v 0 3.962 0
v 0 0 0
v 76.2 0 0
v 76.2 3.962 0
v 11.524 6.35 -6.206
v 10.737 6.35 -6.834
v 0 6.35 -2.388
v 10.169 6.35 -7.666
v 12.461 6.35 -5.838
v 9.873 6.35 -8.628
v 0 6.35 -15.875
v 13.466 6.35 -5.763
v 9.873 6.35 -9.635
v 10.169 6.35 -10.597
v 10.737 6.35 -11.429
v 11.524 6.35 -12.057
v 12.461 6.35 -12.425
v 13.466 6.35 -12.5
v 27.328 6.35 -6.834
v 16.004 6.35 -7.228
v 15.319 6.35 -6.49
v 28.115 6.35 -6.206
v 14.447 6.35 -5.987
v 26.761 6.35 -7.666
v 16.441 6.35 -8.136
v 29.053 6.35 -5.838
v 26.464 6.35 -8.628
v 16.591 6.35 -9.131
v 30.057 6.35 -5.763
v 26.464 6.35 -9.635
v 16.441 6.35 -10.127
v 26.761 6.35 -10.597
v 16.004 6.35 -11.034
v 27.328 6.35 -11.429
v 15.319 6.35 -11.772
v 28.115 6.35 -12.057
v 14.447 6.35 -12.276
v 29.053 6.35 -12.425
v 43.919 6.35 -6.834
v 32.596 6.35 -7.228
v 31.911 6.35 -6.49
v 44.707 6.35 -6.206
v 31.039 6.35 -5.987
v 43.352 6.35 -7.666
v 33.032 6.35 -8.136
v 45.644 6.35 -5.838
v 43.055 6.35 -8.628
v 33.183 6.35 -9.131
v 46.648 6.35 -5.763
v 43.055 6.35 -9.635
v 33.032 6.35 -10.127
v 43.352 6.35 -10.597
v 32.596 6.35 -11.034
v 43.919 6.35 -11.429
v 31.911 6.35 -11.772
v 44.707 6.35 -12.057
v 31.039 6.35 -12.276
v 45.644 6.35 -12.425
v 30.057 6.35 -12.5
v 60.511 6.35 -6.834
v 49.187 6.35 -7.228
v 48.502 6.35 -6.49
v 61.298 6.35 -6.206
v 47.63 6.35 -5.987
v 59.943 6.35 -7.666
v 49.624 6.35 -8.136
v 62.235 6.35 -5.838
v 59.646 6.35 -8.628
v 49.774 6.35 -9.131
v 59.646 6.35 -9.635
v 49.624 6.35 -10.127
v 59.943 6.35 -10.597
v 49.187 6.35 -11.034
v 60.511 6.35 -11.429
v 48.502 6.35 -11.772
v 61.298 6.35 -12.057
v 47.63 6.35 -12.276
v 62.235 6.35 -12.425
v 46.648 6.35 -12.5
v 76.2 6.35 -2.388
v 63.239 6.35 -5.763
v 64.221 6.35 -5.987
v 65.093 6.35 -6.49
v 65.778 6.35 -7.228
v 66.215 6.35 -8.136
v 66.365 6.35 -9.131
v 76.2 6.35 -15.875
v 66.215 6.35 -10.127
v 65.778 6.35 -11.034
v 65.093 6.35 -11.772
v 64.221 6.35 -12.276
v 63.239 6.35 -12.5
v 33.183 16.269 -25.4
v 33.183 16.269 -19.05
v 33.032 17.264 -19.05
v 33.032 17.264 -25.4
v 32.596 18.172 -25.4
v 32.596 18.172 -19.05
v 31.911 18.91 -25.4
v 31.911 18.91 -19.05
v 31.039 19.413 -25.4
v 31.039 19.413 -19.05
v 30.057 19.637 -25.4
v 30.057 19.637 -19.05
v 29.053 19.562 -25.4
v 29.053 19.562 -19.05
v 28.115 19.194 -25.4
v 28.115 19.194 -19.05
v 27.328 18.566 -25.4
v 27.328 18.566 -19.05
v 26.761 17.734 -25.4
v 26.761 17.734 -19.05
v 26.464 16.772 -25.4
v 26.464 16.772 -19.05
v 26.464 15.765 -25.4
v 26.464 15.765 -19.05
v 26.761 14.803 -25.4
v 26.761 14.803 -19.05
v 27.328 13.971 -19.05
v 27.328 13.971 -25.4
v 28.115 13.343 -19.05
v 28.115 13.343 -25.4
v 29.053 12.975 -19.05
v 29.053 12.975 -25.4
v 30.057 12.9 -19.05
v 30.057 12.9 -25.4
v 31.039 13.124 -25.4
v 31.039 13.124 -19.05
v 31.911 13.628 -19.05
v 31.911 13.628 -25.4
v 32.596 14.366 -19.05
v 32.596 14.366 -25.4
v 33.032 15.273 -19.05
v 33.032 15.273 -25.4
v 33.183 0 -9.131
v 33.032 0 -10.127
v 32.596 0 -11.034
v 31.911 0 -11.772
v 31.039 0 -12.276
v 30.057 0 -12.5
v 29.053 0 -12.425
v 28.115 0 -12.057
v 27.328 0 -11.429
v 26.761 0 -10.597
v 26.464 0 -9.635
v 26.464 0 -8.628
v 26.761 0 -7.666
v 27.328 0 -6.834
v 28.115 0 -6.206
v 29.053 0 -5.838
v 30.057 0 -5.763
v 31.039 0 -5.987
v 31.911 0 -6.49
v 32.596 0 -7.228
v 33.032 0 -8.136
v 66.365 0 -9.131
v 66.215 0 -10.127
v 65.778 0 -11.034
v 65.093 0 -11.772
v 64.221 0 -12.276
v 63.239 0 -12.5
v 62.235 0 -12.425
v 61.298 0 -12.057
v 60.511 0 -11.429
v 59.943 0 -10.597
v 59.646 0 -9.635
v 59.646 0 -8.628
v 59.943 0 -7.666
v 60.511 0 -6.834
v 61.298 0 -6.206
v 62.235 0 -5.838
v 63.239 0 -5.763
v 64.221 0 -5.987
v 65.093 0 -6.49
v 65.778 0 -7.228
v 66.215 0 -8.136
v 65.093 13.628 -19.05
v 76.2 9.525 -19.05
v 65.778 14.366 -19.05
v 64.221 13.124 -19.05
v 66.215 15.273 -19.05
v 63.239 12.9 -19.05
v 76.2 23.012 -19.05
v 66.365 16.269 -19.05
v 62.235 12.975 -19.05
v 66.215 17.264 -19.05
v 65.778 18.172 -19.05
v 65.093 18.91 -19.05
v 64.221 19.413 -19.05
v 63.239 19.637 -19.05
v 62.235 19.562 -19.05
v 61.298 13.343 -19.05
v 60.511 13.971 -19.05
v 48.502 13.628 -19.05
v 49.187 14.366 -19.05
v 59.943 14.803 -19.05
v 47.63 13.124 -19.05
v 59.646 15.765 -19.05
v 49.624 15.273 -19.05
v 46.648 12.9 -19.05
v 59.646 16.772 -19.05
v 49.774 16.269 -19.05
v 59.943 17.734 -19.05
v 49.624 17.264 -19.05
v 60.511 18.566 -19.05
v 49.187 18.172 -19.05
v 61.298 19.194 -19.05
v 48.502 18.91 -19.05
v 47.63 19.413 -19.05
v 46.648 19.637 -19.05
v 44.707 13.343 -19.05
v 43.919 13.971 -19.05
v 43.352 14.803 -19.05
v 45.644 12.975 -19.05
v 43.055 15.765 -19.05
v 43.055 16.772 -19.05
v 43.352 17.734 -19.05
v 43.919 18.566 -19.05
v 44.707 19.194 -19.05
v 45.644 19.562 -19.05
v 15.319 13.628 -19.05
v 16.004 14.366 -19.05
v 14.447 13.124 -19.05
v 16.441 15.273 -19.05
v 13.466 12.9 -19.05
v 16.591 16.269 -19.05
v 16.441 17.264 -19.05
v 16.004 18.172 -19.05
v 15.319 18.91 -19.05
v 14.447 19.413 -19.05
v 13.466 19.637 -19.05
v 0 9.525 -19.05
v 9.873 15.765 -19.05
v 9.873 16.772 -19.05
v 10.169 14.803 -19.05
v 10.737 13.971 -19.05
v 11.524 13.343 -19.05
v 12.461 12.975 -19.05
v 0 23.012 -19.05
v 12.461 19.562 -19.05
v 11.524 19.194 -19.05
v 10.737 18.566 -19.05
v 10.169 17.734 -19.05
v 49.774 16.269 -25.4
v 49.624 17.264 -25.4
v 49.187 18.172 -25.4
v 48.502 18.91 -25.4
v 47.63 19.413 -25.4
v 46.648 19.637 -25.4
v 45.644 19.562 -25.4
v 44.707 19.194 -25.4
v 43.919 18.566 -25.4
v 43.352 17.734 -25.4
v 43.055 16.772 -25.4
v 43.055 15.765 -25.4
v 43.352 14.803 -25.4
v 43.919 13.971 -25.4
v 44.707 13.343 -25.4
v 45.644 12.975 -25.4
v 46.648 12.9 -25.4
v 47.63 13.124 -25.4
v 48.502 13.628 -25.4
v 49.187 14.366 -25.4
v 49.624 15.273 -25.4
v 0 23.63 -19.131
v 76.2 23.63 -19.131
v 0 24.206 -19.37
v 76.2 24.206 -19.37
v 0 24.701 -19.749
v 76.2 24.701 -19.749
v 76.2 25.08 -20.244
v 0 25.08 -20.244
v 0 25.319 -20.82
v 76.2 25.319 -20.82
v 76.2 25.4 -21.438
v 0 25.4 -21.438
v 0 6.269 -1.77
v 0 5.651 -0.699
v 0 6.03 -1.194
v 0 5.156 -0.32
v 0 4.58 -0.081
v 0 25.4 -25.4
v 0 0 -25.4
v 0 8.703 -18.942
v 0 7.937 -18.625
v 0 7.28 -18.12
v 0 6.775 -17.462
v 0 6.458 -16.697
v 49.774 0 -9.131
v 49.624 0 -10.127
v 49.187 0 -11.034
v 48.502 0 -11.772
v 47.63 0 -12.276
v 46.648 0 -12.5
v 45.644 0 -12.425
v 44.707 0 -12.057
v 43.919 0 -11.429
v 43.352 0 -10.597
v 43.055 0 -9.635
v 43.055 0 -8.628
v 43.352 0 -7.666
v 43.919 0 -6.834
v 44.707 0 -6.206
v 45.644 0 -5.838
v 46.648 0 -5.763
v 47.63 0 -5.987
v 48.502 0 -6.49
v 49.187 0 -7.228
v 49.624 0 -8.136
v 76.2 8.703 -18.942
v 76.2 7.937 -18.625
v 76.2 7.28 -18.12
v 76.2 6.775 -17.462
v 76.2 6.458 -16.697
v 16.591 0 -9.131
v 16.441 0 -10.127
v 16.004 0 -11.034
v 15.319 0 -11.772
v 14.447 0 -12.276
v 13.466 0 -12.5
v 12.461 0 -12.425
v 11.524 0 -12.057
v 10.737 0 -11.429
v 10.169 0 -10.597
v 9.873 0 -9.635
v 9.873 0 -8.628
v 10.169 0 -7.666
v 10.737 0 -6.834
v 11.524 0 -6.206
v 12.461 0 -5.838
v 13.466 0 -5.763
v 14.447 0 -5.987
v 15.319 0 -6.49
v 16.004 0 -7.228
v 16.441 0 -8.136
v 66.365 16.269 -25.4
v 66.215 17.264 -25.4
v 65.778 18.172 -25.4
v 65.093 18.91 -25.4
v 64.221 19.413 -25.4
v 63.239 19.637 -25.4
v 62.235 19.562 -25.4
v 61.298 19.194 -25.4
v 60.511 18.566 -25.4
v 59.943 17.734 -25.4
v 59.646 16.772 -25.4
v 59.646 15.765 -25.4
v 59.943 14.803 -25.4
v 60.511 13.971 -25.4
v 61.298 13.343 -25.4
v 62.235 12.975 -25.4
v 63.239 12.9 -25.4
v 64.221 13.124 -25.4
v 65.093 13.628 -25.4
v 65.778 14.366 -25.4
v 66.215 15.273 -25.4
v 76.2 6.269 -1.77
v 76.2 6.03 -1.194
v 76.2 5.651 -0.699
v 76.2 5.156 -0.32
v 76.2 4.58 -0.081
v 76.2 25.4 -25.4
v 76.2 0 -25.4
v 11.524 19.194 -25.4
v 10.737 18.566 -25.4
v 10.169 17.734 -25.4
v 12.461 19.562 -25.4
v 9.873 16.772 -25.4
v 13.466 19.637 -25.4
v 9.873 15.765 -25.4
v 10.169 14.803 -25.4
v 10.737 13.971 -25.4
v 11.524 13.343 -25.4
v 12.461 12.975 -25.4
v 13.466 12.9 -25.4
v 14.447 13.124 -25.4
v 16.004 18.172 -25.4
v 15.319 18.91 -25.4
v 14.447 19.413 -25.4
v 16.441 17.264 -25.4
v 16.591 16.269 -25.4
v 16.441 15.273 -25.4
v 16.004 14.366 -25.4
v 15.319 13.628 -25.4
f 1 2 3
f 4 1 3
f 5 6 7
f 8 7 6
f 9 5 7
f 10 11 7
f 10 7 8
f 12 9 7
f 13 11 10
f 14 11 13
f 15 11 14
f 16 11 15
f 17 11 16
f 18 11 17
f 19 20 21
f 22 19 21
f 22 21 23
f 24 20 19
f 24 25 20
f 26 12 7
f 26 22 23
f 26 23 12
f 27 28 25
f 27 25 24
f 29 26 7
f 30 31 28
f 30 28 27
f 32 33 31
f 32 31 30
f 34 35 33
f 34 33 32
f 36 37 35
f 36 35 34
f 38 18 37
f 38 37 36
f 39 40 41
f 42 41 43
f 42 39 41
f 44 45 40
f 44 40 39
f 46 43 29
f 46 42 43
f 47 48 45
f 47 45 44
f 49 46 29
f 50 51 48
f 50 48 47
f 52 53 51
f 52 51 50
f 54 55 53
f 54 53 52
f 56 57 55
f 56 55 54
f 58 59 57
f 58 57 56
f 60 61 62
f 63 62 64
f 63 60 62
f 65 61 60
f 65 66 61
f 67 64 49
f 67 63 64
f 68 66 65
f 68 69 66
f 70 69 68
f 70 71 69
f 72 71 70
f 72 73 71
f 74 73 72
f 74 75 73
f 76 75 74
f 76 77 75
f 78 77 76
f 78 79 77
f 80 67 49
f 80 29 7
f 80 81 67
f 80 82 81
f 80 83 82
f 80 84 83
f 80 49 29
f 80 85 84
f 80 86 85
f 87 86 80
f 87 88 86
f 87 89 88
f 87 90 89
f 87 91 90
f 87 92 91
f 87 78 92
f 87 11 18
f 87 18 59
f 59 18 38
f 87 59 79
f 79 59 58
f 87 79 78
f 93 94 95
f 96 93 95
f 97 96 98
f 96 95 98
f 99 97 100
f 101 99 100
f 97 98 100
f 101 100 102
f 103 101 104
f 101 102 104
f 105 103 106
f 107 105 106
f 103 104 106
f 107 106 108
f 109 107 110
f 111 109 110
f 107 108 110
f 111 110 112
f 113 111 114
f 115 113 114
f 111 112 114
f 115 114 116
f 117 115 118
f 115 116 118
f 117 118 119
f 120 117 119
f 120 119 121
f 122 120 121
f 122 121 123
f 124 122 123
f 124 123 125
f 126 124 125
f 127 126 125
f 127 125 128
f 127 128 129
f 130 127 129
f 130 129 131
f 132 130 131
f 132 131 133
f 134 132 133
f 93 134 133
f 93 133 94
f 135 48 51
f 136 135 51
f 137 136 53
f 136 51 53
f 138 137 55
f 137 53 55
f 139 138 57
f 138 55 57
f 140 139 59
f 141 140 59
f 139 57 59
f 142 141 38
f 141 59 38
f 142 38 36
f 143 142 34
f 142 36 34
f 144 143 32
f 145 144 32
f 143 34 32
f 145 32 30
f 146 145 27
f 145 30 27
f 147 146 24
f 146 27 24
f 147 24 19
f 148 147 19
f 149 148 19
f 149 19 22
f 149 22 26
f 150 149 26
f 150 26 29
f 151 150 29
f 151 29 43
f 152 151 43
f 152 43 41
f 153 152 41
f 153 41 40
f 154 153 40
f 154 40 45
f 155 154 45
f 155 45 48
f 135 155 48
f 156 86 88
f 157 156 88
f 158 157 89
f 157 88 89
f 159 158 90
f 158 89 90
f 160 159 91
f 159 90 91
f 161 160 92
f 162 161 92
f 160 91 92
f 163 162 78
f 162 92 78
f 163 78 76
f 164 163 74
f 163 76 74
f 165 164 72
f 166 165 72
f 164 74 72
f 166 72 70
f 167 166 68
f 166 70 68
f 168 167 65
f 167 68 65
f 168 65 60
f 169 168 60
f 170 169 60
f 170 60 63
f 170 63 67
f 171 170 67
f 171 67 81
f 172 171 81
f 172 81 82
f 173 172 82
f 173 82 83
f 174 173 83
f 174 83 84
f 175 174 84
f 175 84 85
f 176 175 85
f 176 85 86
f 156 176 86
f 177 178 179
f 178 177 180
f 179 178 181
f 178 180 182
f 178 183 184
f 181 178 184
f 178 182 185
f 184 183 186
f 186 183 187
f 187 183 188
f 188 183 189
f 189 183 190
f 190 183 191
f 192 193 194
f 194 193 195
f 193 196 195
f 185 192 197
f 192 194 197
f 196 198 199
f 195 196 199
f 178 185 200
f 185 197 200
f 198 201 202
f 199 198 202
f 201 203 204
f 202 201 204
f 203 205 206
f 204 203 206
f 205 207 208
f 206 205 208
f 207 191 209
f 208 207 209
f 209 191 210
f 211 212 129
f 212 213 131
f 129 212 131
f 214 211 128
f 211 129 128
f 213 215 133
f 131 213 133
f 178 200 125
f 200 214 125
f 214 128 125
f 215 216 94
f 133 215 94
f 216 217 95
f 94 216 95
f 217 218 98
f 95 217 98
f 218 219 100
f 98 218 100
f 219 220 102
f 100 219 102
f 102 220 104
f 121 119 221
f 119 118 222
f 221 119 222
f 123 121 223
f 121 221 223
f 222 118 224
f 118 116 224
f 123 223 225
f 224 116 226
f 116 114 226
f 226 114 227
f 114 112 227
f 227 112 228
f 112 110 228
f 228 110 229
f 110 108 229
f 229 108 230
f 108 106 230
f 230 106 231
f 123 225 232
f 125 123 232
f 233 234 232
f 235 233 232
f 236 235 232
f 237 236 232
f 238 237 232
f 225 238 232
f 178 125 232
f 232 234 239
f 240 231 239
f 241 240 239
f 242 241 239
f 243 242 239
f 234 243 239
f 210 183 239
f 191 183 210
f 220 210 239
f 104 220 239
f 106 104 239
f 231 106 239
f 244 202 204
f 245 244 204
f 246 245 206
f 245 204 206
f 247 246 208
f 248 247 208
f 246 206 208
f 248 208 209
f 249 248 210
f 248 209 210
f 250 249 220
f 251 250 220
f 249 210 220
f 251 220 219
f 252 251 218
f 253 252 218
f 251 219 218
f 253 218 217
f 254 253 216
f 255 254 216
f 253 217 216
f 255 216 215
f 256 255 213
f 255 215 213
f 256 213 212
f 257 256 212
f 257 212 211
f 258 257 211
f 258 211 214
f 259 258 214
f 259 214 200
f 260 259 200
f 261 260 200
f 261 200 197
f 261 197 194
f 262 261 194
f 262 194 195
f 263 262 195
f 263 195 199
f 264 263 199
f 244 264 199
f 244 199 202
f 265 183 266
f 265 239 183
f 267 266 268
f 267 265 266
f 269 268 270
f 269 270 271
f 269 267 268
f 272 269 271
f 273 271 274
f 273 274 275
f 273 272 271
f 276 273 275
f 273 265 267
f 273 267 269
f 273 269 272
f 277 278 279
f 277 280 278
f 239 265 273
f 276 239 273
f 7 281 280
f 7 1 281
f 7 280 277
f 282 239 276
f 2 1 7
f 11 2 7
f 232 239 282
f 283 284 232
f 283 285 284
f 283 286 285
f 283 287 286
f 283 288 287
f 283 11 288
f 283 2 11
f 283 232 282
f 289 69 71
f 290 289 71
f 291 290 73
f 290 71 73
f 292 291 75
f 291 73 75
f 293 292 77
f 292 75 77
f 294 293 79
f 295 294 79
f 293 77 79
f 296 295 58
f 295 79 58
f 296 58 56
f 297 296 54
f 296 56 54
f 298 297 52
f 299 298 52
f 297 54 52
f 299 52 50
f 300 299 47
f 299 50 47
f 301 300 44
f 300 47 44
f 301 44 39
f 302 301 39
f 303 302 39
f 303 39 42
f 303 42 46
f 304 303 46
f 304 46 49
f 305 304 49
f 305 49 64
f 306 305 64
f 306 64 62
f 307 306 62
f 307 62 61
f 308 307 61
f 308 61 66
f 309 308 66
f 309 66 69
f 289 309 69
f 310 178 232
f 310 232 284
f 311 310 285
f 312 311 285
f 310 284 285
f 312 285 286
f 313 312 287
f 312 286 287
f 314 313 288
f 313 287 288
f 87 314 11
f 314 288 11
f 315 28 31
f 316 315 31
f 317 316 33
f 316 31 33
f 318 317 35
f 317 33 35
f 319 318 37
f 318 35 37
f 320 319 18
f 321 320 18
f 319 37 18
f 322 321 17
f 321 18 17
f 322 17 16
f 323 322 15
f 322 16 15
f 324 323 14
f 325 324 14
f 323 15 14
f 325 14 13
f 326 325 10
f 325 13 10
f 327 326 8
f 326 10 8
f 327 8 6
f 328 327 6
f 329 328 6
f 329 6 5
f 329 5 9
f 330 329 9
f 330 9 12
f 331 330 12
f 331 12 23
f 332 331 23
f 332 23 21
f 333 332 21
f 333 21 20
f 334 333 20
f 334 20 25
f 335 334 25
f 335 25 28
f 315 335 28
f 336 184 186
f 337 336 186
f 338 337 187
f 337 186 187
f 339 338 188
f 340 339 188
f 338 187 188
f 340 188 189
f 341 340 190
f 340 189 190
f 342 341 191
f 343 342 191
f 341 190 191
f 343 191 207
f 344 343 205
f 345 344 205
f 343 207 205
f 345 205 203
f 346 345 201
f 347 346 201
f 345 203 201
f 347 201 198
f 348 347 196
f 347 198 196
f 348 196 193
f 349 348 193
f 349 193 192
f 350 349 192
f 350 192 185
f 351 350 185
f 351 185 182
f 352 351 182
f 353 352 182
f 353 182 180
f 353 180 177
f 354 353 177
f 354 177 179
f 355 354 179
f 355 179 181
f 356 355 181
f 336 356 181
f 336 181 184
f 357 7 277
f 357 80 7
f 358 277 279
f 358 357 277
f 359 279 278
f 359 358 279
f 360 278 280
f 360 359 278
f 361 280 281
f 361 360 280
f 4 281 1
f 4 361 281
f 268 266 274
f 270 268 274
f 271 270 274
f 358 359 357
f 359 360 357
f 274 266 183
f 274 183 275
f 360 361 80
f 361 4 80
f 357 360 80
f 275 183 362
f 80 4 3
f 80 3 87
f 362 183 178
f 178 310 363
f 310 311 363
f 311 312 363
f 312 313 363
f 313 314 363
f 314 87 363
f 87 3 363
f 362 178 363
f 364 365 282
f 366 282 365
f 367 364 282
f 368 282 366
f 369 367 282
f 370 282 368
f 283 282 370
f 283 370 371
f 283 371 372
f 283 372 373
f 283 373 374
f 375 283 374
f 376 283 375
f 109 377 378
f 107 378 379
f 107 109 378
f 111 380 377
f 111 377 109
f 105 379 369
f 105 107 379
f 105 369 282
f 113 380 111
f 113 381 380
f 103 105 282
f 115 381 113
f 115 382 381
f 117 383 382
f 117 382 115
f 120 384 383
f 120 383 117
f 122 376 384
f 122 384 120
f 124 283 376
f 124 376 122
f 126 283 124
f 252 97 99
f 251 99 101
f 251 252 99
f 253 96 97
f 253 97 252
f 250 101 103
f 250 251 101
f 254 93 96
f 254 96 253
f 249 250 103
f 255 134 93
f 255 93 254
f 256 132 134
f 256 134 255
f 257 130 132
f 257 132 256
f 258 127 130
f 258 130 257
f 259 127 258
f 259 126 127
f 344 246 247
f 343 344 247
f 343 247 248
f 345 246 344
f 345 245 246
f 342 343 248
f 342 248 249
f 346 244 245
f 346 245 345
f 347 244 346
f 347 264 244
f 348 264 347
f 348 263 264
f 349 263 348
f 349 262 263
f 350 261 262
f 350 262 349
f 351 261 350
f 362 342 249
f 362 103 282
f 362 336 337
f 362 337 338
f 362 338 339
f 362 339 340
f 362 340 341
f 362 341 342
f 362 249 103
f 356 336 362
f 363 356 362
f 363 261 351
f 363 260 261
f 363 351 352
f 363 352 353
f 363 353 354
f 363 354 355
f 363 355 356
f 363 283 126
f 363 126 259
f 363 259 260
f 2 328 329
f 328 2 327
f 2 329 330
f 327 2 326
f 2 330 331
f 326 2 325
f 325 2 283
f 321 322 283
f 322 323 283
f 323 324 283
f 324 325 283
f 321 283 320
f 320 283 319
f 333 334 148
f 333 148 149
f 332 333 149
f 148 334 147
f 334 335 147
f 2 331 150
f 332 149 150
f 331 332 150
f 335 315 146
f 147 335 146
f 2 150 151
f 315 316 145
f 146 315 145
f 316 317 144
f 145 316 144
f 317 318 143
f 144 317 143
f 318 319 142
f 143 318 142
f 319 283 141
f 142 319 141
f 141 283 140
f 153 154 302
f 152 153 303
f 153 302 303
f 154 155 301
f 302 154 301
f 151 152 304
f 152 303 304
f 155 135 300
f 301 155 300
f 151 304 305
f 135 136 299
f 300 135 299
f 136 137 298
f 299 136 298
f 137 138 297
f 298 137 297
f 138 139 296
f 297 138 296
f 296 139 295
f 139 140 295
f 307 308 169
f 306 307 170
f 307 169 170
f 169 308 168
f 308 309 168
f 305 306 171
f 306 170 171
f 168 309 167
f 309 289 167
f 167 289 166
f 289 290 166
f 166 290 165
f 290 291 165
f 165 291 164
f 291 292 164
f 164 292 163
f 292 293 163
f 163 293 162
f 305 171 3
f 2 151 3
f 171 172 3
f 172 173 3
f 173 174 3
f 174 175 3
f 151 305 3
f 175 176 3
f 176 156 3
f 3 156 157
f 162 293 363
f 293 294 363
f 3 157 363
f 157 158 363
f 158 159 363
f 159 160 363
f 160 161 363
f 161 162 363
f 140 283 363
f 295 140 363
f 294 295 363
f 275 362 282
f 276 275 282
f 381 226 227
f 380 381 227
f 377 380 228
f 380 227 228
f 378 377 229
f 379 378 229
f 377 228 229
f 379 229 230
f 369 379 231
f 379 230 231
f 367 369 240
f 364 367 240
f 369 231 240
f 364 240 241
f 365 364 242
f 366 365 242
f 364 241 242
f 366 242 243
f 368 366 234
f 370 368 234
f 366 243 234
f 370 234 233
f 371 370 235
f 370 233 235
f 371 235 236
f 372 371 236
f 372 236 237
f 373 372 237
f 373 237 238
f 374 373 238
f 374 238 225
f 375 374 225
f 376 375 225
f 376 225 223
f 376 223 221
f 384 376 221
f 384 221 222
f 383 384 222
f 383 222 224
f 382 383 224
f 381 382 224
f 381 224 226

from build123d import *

# Parameters (mm, degrees)
SKETCH1_W           = 76.2
SKETCH1_H           = 25.4
BOSS_EXTRUDE1_DEPTH = 6.35
SKETCH2_W           = 76.2
SKETCH2_H           = 25.4
BOSS_EXTRUDE2_DEPTH = 6.35
FILLET1_R           = 3.175
FILLET2_R           = 2.3876
SKETCH3_R           = 3.3782
CUT_EXTRUDE1_DEPTH  = 7.35
SKETCH4_R           = 3.3782
CUT_EXTRUDE2_DEPTH  = 7.35


with BuildPart() as part:
    # Sketch1 → Boss-Extrude1 (new body)
    with BuildSketch(Plane(origin=(0, 0, 0), x_dir=(1, 0, 0), z_dir=(0, 1, 0))):
        with Locations((38.1, 12.7)):
            Rectangle(SKETCH1_W, SKETCH1_H)
    extrude(amount=BOSS_EXTRUDE1_DEPTH)

    # Sketch2 → Boss-Extrude2 (add)
    with BuildSketch(Plane(origin=(0, 0, -25.4), x_dir=(-1, 0, 0), z_dir=(0, 0, -1))):
        with Locations((-38.1, 12.7)):
            Rectangle(SKETCH2_W, SKETCH2_H)
    extrude(amount=-BOSS_EXTRUDE2_DEPTH)

    # Fillet1
    fillet1_edges = [part.edges().sort_by_distance(p)[0] for p in [
        (38.1, 6.35, -19.05),
    ]]
    fillet(fillet1_edges, radius=FILLET1_R)

    # Fillet2
    fillet2_edges = [part.edges().sort_by_distance(p)[0] for p in [
        (38.1, 25.4, -19.05),
        (38.1, 6.35, 0),
    ]]
    fillet(fillet2_edges, radius=FILLET2_R)

    # Sketch3 → Cut-Extrude1 (cut, through all)
    with BuildSketch(Plane(origin=(0, 6.35, 0), x_dir=(1, 0, 0), z_dir=(0, 1, 0))):
        with Locations((13.21308, 9.1313)):
            Circle(SKETCH3_R)
        with Locations((29.80436, 9.1313)):
            Circle(SKETCH3_R)
        with Locations((46.39564, 9.1313)):
            Circle(SKETCH3_R)
        with Locations((62.98692, 9.1313)):
            Circle(SKETCH3_R)
    extrude(amount=-CUT_EXTRUDE1_DEPTH, mode=Mode.SUBTRACT)

    # Sketch4 → Cut-Extrude2 (cut, through all)
    with BuildSketch(Plane.XY.offset(-19.05)):
        with Locations((13.21308, 16.2687)):
            Circle(SKETCH4_R)
        with Locations((29.80436, 16.2687)):
            Circle(SKETCH4_R)
        with Locations((46.39564, 16.2687)):
            Circle(SKETCH4_R)
        with Locations((62.98692, 16.2687)):
            Circle(SKETCH4_R)
    extrude(amount=-CUT_EXTRUDE2_DEPTH, mode=Mode.SUBTRACT)


solid = part.part
